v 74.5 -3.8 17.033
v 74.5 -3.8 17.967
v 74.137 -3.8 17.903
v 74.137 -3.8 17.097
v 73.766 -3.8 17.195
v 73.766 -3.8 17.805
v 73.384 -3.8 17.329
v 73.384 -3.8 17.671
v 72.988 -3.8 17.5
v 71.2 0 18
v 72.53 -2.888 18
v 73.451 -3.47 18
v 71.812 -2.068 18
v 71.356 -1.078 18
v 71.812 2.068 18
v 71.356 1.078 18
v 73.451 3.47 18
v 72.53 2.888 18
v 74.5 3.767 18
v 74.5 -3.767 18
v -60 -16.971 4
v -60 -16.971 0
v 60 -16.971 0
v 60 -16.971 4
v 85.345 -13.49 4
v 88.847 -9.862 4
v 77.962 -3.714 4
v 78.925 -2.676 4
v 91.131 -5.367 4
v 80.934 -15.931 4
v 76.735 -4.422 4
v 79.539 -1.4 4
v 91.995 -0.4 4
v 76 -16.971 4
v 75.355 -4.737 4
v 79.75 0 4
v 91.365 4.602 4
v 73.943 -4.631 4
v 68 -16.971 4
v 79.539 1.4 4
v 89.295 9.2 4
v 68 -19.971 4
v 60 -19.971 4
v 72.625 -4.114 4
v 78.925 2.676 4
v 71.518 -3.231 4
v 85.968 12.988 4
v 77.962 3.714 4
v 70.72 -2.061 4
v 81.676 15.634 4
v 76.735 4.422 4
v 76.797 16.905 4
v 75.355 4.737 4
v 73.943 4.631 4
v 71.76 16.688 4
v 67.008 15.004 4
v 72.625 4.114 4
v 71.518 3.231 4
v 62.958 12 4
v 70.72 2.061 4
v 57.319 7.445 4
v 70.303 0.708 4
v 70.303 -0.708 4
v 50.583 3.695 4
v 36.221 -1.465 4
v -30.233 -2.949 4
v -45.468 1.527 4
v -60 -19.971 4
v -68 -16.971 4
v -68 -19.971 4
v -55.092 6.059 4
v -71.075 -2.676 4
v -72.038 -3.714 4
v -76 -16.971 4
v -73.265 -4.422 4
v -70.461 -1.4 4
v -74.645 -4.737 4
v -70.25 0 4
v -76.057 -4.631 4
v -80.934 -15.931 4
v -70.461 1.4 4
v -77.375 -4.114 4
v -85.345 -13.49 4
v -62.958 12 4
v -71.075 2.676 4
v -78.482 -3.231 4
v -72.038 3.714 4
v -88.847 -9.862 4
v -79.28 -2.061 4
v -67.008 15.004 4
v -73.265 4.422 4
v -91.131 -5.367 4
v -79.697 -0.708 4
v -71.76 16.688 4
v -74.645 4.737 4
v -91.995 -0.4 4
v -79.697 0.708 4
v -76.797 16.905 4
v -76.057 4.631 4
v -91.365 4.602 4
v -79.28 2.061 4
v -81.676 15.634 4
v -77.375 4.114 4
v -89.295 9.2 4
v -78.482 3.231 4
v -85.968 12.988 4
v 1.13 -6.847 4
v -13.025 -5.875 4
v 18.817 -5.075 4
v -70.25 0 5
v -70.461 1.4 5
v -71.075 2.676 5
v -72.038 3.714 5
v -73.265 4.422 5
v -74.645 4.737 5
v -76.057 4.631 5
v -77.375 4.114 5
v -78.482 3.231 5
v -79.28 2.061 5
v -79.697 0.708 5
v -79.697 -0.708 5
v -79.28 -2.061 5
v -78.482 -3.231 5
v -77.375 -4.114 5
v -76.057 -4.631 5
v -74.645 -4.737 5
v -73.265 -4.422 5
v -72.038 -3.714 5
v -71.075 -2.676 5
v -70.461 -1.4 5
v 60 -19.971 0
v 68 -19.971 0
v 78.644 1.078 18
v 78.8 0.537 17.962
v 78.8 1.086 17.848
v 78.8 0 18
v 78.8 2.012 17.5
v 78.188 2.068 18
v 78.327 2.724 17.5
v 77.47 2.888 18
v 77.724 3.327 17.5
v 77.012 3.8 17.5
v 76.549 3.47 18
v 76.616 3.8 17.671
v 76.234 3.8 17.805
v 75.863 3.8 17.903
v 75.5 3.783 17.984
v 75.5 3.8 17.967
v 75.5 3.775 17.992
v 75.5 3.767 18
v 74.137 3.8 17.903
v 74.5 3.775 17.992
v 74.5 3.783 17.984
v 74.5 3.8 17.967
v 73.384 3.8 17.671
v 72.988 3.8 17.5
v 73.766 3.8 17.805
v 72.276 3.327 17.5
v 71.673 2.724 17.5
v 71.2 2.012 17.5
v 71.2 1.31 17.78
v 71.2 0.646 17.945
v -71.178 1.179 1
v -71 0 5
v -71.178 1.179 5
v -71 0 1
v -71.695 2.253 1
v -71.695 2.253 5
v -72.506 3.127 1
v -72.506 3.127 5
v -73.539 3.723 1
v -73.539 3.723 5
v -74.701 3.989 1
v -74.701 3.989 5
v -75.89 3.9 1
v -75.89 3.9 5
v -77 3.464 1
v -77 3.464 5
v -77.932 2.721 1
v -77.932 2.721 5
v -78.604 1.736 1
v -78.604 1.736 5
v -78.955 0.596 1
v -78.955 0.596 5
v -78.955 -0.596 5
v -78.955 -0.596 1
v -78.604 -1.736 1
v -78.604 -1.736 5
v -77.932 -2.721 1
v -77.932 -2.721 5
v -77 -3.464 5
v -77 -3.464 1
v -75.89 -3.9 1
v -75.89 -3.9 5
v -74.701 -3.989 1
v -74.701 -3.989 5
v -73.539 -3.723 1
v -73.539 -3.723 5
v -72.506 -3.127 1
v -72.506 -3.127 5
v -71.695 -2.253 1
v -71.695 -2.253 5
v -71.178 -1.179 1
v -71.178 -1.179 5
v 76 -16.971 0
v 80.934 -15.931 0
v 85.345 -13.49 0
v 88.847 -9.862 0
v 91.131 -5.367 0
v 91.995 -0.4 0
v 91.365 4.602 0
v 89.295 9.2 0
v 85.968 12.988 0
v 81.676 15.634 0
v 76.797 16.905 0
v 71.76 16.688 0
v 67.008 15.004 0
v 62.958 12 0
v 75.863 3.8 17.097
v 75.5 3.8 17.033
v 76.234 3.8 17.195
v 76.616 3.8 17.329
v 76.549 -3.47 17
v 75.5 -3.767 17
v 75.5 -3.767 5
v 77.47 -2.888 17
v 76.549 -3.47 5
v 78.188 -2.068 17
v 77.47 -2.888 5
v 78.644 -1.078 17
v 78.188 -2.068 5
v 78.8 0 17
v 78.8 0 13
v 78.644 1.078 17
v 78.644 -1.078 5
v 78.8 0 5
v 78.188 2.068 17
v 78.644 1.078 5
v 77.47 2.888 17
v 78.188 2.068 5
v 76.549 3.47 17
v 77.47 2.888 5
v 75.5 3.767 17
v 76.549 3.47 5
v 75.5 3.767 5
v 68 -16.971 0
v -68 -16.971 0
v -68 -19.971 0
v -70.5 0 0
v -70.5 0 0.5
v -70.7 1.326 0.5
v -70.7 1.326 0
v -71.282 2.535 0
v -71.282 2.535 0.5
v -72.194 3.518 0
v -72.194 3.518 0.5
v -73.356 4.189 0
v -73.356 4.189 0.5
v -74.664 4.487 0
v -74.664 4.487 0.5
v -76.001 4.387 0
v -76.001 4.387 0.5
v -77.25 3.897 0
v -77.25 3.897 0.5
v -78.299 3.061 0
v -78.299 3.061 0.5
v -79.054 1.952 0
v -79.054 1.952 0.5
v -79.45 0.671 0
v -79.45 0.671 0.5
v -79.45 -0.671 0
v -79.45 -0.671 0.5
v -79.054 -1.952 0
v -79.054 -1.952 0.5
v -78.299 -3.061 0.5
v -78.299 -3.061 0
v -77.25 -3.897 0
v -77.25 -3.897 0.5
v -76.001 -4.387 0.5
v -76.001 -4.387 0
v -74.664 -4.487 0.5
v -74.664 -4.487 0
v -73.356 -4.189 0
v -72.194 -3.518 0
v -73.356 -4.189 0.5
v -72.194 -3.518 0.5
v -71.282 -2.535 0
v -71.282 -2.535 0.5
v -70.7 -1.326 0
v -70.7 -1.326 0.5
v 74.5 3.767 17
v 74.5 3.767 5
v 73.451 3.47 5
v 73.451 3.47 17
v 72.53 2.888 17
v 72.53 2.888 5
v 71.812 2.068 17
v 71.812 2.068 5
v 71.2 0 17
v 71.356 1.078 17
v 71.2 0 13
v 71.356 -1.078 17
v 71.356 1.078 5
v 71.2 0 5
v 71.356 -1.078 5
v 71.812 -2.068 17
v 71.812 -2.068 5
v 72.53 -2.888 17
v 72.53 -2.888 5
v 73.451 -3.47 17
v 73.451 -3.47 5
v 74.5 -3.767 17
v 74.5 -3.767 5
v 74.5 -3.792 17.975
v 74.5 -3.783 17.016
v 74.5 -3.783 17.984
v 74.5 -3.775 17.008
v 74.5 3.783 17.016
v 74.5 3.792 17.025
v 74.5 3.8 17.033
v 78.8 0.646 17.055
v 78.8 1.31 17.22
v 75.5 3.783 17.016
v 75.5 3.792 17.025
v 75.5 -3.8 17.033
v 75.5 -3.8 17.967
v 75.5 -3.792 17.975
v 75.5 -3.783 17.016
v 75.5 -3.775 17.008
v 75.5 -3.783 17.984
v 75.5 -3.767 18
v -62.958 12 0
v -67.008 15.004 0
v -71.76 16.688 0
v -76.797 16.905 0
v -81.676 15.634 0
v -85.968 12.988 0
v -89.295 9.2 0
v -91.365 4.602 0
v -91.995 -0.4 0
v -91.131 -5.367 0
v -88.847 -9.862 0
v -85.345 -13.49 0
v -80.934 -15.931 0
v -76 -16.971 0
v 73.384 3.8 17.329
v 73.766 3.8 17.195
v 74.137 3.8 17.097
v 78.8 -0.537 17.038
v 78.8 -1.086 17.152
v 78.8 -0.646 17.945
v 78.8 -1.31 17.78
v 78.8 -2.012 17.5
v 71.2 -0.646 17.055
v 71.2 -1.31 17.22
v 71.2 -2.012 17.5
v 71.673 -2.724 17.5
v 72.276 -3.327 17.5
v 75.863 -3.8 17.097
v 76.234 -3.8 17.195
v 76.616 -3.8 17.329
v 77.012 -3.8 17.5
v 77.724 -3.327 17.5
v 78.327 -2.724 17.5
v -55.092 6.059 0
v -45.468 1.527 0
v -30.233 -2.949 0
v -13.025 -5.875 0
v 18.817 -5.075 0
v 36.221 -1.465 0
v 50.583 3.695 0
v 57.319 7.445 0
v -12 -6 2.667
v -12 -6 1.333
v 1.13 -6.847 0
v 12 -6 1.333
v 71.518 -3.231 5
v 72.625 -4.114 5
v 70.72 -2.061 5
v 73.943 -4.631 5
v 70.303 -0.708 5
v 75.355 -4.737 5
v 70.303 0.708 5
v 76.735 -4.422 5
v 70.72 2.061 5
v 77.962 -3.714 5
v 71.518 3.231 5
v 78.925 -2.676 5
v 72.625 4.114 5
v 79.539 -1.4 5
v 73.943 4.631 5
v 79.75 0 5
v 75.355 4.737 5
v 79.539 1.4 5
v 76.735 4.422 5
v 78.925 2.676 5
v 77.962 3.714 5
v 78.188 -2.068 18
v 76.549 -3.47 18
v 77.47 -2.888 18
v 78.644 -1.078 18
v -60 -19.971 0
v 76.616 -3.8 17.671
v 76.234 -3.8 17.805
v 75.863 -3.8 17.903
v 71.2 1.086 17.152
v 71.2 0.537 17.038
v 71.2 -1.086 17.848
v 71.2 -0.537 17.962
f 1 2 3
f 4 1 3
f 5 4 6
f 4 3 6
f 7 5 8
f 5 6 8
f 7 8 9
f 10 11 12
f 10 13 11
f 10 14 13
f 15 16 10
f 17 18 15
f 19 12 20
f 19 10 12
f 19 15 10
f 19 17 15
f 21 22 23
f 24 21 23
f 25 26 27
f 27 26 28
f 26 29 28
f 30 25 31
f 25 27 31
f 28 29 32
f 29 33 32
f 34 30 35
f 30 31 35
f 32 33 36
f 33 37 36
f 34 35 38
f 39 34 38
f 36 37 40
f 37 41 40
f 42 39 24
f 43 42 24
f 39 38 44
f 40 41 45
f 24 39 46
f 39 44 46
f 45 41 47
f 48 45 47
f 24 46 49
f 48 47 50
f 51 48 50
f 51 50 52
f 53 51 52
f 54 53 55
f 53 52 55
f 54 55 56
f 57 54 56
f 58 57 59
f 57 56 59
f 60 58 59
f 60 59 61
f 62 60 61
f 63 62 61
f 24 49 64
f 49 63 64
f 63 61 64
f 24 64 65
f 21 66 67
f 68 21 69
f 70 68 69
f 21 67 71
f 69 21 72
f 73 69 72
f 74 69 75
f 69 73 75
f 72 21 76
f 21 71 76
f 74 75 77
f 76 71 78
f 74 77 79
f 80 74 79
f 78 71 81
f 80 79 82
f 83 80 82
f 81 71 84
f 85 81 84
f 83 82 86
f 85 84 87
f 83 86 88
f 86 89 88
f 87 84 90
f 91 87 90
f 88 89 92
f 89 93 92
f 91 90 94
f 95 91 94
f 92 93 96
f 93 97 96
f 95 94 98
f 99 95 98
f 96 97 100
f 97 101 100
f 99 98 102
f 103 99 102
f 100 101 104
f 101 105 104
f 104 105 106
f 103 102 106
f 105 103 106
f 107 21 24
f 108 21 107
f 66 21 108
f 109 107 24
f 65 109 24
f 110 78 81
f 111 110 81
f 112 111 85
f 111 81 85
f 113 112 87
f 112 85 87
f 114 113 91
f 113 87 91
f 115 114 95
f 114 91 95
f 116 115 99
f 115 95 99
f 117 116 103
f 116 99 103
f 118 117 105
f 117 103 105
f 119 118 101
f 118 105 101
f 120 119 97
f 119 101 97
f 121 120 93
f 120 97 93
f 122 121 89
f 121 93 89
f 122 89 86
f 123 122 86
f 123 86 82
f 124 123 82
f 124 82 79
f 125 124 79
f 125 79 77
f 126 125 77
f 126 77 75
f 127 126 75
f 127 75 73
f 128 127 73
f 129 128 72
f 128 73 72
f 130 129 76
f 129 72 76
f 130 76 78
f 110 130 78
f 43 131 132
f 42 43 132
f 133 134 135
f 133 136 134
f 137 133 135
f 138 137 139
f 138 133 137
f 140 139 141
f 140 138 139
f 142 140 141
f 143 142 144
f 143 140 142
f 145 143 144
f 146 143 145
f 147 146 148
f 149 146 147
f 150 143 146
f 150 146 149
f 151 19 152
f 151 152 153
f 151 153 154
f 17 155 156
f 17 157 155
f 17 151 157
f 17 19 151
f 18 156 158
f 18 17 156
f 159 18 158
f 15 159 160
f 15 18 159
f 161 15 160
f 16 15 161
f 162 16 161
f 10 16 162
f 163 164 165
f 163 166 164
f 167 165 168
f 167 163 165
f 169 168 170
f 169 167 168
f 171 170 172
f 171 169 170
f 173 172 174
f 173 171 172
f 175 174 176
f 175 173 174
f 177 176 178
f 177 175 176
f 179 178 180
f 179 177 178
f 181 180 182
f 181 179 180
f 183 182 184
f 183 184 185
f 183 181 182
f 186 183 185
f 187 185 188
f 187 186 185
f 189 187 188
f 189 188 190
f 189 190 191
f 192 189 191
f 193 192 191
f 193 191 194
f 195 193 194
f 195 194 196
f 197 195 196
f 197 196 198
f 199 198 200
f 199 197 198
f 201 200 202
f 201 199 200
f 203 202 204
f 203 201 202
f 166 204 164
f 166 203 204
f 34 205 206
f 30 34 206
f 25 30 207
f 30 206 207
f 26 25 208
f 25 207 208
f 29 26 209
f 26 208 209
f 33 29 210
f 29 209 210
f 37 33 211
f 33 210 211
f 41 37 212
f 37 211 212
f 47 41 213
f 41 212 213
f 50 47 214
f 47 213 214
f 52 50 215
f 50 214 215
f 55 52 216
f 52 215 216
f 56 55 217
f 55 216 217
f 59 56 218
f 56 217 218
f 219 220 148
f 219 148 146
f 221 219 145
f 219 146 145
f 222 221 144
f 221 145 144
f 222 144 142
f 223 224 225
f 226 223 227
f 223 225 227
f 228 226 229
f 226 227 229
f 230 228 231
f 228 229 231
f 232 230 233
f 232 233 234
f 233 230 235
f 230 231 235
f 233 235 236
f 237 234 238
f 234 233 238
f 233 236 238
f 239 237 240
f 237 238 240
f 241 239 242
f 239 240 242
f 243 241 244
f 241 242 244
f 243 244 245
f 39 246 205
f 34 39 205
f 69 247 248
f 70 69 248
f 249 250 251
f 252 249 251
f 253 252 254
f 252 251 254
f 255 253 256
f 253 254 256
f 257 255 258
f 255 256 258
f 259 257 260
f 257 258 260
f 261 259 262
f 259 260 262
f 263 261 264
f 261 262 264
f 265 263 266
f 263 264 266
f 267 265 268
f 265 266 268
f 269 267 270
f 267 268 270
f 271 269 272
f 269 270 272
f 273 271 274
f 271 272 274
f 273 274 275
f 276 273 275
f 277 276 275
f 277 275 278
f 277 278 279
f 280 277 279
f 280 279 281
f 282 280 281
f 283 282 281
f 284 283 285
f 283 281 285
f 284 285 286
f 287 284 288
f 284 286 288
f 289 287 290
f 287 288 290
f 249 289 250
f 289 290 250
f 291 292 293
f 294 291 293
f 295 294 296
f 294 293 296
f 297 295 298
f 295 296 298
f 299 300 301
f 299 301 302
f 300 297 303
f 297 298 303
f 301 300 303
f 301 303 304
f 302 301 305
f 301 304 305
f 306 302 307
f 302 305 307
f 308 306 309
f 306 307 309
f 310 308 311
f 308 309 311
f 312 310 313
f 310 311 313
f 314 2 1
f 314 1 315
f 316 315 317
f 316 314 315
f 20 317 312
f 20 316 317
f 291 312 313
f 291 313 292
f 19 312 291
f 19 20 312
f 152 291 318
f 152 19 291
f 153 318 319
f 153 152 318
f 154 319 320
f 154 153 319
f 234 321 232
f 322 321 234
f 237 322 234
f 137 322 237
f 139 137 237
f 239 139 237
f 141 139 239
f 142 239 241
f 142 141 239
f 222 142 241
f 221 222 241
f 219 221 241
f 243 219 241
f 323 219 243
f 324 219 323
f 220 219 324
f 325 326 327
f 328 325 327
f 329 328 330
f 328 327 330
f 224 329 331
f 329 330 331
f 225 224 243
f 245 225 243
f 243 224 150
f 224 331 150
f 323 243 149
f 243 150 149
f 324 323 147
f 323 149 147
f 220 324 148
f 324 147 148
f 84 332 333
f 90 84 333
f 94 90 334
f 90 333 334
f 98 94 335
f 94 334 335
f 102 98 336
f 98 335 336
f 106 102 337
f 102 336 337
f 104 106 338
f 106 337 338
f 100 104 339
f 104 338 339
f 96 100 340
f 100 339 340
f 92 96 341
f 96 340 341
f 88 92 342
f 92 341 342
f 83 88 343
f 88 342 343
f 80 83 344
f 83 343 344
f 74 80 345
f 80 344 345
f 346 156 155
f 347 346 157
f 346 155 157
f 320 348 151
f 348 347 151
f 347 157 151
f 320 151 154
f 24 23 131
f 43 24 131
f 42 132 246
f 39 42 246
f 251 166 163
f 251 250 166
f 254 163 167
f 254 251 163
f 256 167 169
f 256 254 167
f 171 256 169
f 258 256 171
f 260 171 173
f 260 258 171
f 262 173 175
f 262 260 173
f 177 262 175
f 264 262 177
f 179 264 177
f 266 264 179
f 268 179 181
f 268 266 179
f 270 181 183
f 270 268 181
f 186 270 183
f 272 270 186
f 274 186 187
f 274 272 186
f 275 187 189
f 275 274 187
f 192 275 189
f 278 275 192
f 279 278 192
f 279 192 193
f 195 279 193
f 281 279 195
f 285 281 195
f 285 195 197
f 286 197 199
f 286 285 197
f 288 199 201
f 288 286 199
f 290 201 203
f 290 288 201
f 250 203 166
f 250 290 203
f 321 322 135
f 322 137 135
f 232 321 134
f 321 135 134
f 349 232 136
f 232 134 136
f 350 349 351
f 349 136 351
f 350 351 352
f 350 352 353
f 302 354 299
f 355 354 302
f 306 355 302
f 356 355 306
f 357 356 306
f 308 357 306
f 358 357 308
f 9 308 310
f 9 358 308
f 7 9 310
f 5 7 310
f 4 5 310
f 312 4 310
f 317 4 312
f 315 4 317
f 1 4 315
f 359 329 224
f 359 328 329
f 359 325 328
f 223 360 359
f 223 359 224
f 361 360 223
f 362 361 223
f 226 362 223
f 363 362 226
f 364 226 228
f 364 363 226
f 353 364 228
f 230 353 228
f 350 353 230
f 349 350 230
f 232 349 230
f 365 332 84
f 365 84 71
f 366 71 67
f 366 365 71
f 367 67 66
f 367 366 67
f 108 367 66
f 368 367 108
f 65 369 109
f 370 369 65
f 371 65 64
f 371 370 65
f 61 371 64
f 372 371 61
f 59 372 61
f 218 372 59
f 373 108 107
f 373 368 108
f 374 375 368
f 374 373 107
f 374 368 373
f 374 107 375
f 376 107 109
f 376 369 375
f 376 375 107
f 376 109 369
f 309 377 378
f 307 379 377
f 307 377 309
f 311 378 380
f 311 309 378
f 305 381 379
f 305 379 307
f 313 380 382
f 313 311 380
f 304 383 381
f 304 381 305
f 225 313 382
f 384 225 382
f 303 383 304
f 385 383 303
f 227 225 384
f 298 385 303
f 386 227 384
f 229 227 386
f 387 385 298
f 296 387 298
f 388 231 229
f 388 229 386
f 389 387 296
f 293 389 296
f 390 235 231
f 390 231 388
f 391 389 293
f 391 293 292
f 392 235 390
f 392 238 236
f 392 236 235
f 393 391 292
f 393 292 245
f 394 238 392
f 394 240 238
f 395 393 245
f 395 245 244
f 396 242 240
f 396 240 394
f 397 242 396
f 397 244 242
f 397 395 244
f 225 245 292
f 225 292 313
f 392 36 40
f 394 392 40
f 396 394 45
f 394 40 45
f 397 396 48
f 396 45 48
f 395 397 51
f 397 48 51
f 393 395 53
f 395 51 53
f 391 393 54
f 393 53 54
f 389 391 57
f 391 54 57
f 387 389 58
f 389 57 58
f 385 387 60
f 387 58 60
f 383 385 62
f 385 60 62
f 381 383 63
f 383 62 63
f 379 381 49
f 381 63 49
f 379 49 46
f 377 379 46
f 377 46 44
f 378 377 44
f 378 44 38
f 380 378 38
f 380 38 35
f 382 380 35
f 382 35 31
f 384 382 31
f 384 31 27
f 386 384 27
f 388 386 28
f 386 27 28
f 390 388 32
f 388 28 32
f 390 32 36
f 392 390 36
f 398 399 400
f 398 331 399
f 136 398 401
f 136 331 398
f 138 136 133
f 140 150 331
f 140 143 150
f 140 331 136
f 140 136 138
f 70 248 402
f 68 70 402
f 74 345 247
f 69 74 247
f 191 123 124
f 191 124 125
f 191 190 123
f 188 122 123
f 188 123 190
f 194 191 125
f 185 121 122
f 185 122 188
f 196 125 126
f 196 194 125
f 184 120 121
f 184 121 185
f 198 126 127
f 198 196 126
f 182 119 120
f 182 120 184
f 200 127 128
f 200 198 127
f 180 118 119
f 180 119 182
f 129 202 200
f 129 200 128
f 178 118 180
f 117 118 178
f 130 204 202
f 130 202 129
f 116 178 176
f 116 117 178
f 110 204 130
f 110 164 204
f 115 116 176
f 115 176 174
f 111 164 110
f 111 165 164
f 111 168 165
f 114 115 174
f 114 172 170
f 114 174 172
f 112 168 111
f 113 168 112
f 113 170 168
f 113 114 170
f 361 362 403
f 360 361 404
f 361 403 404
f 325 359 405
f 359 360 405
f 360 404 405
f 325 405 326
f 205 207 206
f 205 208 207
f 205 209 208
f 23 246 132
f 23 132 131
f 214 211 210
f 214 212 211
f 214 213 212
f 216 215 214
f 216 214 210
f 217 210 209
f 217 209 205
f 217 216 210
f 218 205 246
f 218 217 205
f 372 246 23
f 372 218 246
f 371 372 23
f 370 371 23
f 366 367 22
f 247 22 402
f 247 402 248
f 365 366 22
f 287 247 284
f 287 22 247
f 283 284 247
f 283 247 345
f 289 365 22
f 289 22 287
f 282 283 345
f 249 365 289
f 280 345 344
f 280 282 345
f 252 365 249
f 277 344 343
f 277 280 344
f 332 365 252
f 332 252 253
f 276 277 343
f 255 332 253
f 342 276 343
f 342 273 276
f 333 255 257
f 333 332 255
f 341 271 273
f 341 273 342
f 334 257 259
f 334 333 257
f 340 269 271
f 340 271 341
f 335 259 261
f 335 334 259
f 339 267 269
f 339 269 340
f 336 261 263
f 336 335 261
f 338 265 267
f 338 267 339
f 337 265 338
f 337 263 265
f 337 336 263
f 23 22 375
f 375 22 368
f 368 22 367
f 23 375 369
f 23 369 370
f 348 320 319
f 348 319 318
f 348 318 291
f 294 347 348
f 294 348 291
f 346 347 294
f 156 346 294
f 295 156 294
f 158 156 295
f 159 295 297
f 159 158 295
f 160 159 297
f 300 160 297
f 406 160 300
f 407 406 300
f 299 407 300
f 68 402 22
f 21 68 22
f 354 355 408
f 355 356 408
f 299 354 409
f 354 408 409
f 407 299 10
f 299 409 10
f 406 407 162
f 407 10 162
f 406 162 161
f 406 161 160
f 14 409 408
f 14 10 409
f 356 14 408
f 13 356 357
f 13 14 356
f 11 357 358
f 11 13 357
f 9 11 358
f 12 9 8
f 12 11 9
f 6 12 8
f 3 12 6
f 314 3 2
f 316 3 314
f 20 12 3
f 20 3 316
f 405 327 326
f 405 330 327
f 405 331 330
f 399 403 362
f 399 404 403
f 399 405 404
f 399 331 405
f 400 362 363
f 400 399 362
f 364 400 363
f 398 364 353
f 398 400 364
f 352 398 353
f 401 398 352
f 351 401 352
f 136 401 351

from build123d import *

# Parameters (mm, degrees)
F2_DEPTH  = 4
F3_R      = 3.8
F4_DEPTH  = 13
F5_R      = 3.8
F6_DEPTH  = 0.5
F6_TAPER  = -45
F7_R      = 4.3
F8_DEPTH  = 0.5
F8_TAPER  = 45
F9_W      = 1
F9_H      = 11
F10_DEPTH = 13
F11_R     = 4
F12_DEPTH = 3
F13_R     = 4
F14_DEPTH = 0.5
F14_TAPER = -45
F15_DEPTH = 0.5
F16_R     = 4.75
F16_R_2   = 4
F16_R_3   = 3.8
F17_DEPTH = 1
F18_W     = 11.6
F18_H     = 11.6
F19_DEPTH = 5


with BuildPart() as f2:
    # F1 (on Top) → F2 (new body)
    with BuildSketch(Plane.XY):
        with BuildLine():
            add(Edge.make_bspline(
                [(-62.9584054212, 12), (-50.9998563223, 0), (-9.8574829598, -7.14219171), (9.8574829598, -7.14219171), (50.9998563223, 0), (62.9584054212, 12)],
                knots=[0, 0, 0, 0, 0.3750382163, 0.6249617837, 1, 1, 1, 1], degree=3))
            ThreePointArc((-62.9584054212, 12), (-90.5016960105, 6.9783537313), (-76, -16.9705627485))
            Line((-76, -16.9705627485), (-68, -16.9705627485))
            Line((-68, -16.9705627485), (-68, -19.9705627485))
            Line((-68, -19.9705627485), (-60, -19.9705627485))
            Line((-60, -19.9705627485), (-60, -16.9705627485))
            Line((-60, -16.9705627485), (60, -16.9705627485))
            Line((60, -16.9705627485), (60, -19.9705627485))
            Line((60, -19.9705627485), (68, -19.9705627485))
            Line((68, -19.9705627485), (68, -16.9705627485))
            Line((68, -16.9705627485), (76, -16.9705627485))
            ThreePointArc((76, -16.9705627485), (90.5016960105, 6.9783537313), (62.9584054212, 12))
        make_face()
    extrude(amount=F2_DEPTH)

    # F3 (on face) → F4 (join)
    with BuildSketch(Plane.XY.offset(4)):
        with Locations((75, 0)):
            Circle(F3_R)
    extrude(amount=F4_DEPTH)

    # F5 (on face) → F6 (join)
    with BuildSketch(Plane.XY.offset(17)):
        with Locations((75, 0)):
            Circle(F5_R)
    extrude(amount=F6_DEPTH, taper=F6_TAPER)

    # F7 (on face) → F8 (join)
    with BuildSketch(Plane.XY.offset(17.5)):
        with Locations((75, 0)):
            Circle(F7_R)
    extrude(amount=F8_DEPTH, taper=F8_TAPER)

    # F9 (on face) → F10 (cut)
    with BuildSketch(Plane.XY.offset(18)):
        with Locations((75, 0)):
            Rectangle(F9_W, F9_H)
    extrude(amount=-F10_DEPTH, mode=Mode.SUBTRACT)

    # F11 (on face) → F12 (cut)
    with BuildSketch(Plane.XY.offset(4)):
        with Locations((-75, 0)):
            Circle(F11_R)
    extrude(amount=-F12_DEPTH, mode=Mode.SUBTRACT)

    # F13 (on face) → F14 (cut)
    with BuildSketch(Plane.XY.offset(1)):
        with Locations((-75, 0)):
            Circle(F13_R)
    extrude(amount=-F14_DEPTH, taper=F14_TAPER, mode=Mode.SUBTRACT)

    # F15 (cut): a face of the model
    f15_faces = [f2.faces().sort_by_distance(p)[0] for p in [
        (-75, 0, 0.5),
    ]]
    extrude(f15_faces, amount=-F15_DEPTH, mode=Mode.SUBTRACT)

    # F16 (on face) → F17 (join)
    with BuildSketch(Plane.XY.offset(4)):
        with Locations((-75, 0)):
            Circle(F16_R)
        with Locations((-75, 0)):
            Circle(F16_R_2, mode=Mode.SUBTRACT)
        with Locations((75, 0)):
            Circle(F16_R)
        with Locations((75, 0)):
            Circle(F16_R_3, mode=Mode.SUBTRACT)
    extrude(amount=F17_DEPTH)

    # F18 (on face) → F19 (cut)
    with BuildSketch(Plane.XY.offset(18)):
        with Locations((75, 0)):
            Rectangle(F18_W, F18_H)
        Polygon((71.2, 0), (71.2, 3.8), (78.8, 3.8), (78.8, -3.8), (71.2, -3.8), align=None, mode=Mode.SUBTRACT)
    extrude(amount=-F19_DEPTH, mode=Mode.SUBTRACT)


solid = f2.part
